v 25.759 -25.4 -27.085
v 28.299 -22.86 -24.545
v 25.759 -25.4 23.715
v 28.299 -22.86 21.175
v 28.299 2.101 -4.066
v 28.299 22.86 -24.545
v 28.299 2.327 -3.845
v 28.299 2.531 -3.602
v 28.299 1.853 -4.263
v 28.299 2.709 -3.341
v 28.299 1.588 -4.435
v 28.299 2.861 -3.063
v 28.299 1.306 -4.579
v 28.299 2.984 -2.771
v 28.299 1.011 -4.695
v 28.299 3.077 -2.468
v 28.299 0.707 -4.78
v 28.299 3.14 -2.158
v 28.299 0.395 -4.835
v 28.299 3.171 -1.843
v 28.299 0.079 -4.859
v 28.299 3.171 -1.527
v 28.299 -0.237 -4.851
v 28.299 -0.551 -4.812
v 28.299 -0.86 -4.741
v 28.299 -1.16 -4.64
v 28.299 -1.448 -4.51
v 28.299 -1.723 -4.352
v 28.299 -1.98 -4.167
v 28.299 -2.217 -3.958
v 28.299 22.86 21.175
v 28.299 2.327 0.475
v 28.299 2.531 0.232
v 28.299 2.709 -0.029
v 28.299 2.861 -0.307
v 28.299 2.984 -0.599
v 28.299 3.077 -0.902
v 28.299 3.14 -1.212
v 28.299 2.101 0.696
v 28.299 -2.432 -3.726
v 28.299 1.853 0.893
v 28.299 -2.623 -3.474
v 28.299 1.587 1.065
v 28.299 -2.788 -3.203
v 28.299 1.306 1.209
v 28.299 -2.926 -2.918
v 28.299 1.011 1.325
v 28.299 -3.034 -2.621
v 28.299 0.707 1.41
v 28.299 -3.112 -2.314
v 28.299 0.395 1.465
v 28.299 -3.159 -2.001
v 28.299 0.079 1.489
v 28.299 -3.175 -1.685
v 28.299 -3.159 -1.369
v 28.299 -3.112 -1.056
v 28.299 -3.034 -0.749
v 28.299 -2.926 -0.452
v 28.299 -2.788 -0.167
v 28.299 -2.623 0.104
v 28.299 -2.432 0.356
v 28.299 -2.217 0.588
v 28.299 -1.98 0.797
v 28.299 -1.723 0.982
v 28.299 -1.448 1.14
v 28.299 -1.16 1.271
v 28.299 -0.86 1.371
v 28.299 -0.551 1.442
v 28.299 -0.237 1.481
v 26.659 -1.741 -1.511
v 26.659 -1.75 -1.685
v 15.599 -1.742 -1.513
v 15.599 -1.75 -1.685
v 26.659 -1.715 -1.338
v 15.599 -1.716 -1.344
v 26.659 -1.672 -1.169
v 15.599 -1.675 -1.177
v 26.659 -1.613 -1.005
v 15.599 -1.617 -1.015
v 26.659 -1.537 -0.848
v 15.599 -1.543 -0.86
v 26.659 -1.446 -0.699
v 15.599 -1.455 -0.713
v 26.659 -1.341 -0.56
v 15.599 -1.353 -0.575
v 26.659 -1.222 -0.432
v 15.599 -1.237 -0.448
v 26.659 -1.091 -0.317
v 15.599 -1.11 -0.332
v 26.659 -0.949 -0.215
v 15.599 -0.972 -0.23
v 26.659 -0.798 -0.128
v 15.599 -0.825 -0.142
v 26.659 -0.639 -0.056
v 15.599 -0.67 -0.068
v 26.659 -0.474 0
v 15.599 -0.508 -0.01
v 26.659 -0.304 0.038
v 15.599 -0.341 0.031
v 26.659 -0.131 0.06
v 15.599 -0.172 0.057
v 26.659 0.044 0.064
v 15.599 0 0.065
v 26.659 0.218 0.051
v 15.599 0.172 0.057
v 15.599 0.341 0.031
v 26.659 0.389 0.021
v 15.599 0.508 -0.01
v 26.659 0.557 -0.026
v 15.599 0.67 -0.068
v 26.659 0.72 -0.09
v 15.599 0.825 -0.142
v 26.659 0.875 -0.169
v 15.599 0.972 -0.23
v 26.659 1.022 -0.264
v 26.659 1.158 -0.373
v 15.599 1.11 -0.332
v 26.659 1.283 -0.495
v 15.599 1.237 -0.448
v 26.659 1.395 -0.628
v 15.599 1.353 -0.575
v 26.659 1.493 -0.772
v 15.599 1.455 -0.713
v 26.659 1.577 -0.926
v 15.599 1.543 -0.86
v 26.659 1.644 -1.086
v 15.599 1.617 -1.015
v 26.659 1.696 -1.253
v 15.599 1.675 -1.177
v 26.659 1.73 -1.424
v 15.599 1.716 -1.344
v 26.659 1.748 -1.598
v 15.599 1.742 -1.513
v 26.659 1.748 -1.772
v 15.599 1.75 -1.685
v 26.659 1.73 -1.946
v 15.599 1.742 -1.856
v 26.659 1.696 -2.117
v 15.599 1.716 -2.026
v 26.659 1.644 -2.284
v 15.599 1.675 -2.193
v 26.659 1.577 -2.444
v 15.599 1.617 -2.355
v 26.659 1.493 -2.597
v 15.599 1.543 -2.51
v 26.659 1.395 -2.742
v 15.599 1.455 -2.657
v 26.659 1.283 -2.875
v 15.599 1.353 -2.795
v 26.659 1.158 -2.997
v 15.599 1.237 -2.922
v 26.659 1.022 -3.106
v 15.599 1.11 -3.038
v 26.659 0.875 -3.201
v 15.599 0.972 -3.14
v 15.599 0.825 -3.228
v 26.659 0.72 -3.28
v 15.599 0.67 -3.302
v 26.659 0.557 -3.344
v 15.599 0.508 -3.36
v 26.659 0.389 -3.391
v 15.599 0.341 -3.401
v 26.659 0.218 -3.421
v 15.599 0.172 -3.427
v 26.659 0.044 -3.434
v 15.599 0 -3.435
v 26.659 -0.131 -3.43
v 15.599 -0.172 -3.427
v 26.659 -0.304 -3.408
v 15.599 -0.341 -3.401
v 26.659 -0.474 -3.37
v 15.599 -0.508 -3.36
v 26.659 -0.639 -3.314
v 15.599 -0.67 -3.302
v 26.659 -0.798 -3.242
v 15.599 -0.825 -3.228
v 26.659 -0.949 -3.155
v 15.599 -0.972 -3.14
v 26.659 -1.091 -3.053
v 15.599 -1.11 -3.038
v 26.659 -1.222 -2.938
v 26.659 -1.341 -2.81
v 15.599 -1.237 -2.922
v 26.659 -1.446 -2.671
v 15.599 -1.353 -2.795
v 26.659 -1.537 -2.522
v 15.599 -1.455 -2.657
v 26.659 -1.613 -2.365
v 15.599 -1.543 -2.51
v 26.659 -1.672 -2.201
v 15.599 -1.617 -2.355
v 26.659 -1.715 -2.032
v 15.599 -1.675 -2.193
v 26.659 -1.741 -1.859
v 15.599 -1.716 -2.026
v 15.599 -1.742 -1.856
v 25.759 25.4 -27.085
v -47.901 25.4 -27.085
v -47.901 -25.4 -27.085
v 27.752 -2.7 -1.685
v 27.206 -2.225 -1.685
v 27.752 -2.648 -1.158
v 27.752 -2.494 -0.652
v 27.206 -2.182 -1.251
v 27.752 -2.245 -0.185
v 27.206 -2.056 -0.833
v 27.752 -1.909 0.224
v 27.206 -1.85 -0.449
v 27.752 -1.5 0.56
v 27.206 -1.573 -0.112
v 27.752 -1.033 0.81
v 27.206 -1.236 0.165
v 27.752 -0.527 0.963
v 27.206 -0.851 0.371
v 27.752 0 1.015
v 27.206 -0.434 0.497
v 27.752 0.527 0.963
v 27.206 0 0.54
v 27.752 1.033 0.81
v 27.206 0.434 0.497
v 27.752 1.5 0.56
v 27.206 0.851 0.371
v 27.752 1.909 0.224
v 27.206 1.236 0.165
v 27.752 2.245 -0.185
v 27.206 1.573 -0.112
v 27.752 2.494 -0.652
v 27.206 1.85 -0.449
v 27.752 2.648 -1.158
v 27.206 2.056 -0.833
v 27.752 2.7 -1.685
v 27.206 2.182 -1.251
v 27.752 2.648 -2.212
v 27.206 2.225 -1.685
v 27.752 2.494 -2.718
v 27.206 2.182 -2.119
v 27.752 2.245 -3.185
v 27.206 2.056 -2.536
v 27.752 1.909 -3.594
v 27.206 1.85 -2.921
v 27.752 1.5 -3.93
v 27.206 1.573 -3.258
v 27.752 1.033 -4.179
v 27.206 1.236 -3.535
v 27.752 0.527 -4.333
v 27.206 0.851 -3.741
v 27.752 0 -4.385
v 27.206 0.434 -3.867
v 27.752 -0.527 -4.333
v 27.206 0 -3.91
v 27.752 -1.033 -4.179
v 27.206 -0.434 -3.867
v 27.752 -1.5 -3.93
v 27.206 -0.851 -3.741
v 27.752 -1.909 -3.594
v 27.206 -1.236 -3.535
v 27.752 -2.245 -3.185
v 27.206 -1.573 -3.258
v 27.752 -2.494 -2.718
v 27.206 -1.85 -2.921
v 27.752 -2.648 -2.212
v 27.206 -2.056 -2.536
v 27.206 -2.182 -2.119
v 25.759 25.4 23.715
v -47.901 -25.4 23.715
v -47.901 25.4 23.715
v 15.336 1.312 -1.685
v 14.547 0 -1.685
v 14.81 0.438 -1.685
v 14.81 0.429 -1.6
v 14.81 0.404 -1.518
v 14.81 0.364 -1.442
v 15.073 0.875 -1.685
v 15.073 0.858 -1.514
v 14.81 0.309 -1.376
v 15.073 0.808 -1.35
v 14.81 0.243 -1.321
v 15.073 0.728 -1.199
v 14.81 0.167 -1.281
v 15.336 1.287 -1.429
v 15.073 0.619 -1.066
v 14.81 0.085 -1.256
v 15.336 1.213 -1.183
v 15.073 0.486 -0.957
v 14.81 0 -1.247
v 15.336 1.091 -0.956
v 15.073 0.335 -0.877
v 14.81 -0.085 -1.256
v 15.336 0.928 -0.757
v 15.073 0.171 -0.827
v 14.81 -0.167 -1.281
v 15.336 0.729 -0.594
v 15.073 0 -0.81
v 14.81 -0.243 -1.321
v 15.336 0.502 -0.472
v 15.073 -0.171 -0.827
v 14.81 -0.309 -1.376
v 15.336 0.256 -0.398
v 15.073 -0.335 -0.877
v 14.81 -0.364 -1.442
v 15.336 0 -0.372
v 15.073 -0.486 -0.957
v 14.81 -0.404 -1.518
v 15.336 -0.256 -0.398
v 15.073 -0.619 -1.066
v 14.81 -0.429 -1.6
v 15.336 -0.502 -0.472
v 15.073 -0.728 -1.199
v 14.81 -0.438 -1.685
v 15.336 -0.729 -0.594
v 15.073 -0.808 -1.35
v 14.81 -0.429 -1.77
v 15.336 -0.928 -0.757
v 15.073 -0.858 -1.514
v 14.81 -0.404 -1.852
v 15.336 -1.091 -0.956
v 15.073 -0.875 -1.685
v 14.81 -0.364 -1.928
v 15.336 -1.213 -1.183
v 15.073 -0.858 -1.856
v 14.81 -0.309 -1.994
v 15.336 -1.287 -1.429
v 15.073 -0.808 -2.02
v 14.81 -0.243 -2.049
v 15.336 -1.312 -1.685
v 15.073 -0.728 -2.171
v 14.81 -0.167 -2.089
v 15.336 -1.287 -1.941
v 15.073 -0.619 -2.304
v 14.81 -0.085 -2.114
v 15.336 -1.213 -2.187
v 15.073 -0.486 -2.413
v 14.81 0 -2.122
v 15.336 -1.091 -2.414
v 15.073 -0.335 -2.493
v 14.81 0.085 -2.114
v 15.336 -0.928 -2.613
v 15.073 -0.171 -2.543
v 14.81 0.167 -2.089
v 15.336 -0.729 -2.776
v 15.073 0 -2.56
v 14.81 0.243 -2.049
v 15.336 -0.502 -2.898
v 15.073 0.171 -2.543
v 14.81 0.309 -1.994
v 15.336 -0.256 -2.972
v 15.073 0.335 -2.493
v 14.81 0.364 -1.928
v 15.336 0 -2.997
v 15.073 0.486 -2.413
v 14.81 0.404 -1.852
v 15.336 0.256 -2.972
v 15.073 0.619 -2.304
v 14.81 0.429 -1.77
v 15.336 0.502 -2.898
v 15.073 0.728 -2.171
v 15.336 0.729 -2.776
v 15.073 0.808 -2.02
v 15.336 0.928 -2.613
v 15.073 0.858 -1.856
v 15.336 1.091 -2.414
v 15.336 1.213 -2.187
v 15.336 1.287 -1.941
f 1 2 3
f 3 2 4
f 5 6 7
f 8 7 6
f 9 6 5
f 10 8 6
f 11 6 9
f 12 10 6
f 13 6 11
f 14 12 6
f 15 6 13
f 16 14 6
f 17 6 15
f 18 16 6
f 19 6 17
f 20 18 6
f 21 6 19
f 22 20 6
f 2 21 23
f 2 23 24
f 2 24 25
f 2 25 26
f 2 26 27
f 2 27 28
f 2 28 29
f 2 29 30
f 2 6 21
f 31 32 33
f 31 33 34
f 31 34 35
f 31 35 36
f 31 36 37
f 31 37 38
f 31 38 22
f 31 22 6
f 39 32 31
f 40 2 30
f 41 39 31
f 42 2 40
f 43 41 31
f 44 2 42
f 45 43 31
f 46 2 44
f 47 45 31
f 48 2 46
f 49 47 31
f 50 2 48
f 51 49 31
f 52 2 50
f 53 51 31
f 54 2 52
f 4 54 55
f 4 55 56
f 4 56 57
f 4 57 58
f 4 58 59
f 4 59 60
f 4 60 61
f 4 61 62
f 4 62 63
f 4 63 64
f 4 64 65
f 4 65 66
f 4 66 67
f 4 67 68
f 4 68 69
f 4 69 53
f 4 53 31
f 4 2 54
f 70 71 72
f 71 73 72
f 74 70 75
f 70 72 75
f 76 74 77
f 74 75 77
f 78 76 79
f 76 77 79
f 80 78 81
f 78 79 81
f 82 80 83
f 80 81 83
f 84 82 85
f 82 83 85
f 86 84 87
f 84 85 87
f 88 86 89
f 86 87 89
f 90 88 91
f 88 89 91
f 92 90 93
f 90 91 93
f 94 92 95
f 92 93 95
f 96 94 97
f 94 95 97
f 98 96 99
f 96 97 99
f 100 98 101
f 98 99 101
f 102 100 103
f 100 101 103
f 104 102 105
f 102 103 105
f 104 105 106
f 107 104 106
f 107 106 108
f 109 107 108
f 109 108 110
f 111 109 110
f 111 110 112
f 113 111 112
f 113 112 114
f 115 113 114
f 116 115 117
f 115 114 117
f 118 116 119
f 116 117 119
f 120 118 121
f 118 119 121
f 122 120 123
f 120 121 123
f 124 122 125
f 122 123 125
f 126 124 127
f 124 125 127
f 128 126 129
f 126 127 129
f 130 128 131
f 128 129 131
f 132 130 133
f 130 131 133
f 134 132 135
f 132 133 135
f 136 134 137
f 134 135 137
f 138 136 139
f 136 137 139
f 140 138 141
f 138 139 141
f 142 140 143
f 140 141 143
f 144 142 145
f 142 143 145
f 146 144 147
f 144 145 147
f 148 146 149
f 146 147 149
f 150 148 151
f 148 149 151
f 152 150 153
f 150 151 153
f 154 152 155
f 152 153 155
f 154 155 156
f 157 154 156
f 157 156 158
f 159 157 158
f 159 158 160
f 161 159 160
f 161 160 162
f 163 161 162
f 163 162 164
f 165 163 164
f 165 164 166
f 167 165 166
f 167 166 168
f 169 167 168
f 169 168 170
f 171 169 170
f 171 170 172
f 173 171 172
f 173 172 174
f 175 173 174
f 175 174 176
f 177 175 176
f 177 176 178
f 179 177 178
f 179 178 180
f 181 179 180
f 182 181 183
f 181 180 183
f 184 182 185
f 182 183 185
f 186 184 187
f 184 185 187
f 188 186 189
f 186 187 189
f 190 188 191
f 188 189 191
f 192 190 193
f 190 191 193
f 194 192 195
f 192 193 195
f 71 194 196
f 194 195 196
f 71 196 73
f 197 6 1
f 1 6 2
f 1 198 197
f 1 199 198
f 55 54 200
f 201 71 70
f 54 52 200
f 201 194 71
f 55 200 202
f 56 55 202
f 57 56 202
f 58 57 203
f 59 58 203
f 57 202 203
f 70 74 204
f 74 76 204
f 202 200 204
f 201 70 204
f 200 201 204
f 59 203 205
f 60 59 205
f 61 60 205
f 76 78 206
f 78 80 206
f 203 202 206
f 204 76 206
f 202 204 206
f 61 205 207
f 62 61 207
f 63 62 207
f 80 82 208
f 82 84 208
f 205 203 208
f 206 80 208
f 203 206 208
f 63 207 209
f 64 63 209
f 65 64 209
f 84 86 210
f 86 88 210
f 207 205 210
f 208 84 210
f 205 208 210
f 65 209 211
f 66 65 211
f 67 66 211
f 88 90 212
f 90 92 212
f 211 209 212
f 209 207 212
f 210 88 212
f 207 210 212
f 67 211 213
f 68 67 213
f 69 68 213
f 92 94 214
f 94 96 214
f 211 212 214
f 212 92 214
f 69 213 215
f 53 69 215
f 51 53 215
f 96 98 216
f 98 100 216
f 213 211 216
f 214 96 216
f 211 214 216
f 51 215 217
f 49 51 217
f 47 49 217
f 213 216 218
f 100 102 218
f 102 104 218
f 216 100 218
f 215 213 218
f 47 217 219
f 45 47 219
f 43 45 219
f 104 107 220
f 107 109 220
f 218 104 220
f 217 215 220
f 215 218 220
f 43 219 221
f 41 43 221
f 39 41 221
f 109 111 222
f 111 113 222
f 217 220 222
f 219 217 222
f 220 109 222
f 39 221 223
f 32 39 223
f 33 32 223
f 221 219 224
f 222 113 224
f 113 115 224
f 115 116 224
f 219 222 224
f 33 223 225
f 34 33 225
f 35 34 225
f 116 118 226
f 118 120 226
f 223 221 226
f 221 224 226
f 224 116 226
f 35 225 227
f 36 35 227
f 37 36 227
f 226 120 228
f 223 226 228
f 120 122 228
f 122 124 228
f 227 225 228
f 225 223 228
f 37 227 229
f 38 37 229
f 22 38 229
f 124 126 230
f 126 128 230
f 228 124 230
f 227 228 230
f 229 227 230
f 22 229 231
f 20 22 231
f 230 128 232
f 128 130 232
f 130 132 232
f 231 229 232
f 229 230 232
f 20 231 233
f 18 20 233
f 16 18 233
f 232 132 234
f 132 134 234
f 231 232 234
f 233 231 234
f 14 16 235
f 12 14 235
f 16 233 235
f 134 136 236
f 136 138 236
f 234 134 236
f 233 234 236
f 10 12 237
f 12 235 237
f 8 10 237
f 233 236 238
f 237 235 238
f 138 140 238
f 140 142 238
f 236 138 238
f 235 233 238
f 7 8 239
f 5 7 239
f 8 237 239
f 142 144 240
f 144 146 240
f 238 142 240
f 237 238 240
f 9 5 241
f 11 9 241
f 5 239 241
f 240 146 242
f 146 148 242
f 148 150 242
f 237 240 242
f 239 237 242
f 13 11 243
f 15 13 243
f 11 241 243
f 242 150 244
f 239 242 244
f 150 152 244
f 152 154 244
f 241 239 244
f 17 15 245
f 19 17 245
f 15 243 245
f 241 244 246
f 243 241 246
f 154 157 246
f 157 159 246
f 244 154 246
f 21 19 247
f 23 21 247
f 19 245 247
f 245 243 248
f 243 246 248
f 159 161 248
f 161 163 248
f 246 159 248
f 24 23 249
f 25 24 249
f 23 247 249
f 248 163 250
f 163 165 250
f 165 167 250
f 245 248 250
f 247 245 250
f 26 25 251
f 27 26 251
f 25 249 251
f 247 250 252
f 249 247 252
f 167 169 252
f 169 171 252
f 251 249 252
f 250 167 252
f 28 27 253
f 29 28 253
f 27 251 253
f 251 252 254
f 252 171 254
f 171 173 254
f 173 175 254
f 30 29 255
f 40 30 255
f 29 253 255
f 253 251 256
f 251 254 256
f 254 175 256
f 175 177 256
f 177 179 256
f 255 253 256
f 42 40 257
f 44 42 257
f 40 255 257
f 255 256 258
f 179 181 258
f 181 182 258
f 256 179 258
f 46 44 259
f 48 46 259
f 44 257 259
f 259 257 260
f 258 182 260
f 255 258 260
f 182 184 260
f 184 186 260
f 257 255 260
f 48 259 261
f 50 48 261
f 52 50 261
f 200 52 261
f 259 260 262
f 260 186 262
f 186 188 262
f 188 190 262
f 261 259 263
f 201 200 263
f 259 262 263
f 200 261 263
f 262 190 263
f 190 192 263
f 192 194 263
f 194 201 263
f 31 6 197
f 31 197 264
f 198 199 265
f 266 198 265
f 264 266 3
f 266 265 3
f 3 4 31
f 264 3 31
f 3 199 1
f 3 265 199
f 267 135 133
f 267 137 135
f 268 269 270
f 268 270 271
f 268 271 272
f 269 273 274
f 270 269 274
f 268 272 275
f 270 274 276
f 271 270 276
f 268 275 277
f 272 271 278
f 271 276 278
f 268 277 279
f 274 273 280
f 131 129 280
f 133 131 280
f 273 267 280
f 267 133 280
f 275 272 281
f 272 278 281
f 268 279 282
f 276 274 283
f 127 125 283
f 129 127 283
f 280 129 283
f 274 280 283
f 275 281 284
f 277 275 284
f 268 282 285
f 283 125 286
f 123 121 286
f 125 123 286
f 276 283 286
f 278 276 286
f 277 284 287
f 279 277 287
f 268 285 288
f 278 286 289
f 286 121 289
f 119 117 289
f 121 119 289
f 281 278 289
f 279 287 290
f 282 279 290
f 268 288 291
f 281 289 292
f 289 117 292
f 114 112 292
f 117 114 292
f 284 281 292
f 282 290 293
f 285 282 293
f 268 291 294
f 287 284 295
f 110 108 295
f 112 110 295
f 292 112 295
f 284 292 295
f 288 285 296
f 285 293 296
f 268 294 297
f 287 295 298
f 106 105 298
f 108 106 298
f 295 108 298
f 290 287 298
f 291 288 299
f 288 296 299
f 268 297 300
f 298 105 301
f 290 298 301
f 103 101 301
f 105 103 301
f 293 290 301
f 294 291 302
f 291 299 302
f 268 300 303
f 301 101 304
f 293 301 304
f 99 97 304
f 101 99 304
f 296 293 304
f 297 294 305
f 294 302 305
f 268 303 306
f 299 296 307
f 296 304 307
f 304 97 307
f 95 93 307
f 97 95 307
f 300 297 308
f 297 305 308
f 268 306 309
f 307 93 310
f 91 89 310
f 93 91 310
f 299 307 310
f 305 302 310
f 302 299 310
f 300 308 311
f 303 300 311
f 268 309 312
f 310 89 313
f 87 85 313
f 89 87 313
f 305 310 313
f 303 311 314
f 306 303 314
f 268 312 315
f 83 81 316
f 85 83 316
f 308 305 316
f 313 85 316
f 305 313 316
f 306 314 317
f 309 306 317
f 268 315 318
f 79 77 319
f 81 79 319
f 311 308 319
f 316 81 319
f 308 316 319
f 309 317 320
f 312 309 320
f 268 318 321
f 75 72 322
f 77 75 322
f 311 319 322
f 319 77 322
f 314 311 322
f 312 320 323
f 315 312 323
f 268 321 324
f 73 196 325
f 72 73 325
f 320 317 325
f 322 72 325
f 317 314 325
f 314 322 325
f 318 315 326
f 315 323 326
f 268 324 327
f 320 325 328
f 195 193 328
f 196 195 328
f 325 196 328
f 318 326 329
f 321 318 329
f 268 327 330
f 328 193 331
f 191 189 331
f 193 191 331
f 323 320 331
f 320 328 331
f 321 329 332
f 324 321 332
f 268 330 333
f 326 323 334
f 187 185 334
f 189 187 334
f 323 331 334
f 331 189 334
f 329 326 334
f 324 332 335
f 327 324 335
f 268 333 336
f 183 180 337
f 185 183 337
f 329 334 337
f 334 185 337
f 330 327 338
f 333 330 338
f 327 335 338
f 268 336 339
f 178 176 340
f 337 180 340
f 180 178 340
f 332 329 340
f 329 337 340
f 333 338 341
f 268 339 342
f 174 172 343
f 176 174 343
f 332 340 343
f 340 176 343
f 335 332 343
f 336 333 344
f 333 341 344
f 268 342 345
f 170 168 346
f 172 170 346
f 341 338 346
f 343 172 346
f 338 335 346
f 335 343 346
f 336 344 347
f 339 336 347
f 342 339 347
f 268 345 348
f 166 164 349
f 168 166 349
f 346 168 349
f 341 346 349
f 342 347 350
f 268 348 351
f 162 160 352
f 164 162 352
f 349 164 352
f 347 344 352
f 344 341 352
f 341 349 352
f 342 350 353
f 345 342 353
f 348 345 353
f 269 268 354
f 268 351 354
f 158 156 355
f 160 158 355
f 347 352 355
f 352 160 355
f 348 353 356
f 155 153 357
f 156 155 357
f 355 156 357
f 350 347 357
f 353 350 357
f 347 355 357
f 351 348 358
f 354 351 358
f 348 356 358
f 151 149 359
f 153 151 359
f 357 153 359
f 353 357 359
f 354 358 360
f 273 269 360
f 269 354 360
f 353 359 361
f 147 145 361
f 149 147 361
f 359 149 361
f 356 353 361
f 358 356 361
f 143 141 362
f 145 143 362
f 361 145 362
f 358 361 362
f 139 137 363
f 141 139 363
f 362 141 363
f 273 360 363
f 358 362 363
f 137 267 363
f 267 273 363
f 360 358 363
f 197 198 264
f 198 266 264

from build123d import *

# Parameters (mm, degrees)
F0_W           = 76.2
F0_H           = 50.8
F1_DEPTH       = 25.4
F3_D           = 3.5
F3_DEPTH       = 12.7
F3_CSINK_D     = 6.35
F3_CSINK_ANGLE = 82
F3_TIP         = 1.0515060833
F4_SIZE        = 2.54


with BuildPart() as f1:
    # F0 (on Front) → F1 (new body, symmetric)
    with BuildSketch(Plane.XZ):
        with Locations((-9.801236459, -1.6849683598)):
            Rectangle(F0_W, F0_H)
    extrude(amount=F1_DEPTH, both=True)

    # F3
    with Locations(Plane.YZ.offset(28.298763541)):
        with Locations((0, -1.6849683598)):
            CounterSinkHole(F3_D / 2, F3_CSINK_D / 2, depth=F3_DEPTH, counter_sink_angle=F3_CSINK_ANGLE)
            with Locations((0, 0, -(F3_DEPTH + F3_TIP / 2))):  # 118° drill point
                Cone(0, F3_D / 2, F3_TIP, mode=Mode.SUBTRACT)

    # F4
    f4_edges = [f1.edges().sort_by_distance(p)[0] for p in [
        (28.298764, 0, -27.084968),
        (28.298764, -25.4, -1.684968),
        (28.298764, 0, 23.715032),
        (28.298764, 25.4, -1.684968),
    ]]
    chamfer(f4_edges, length=F4_SIZE)


solid = f1.part
